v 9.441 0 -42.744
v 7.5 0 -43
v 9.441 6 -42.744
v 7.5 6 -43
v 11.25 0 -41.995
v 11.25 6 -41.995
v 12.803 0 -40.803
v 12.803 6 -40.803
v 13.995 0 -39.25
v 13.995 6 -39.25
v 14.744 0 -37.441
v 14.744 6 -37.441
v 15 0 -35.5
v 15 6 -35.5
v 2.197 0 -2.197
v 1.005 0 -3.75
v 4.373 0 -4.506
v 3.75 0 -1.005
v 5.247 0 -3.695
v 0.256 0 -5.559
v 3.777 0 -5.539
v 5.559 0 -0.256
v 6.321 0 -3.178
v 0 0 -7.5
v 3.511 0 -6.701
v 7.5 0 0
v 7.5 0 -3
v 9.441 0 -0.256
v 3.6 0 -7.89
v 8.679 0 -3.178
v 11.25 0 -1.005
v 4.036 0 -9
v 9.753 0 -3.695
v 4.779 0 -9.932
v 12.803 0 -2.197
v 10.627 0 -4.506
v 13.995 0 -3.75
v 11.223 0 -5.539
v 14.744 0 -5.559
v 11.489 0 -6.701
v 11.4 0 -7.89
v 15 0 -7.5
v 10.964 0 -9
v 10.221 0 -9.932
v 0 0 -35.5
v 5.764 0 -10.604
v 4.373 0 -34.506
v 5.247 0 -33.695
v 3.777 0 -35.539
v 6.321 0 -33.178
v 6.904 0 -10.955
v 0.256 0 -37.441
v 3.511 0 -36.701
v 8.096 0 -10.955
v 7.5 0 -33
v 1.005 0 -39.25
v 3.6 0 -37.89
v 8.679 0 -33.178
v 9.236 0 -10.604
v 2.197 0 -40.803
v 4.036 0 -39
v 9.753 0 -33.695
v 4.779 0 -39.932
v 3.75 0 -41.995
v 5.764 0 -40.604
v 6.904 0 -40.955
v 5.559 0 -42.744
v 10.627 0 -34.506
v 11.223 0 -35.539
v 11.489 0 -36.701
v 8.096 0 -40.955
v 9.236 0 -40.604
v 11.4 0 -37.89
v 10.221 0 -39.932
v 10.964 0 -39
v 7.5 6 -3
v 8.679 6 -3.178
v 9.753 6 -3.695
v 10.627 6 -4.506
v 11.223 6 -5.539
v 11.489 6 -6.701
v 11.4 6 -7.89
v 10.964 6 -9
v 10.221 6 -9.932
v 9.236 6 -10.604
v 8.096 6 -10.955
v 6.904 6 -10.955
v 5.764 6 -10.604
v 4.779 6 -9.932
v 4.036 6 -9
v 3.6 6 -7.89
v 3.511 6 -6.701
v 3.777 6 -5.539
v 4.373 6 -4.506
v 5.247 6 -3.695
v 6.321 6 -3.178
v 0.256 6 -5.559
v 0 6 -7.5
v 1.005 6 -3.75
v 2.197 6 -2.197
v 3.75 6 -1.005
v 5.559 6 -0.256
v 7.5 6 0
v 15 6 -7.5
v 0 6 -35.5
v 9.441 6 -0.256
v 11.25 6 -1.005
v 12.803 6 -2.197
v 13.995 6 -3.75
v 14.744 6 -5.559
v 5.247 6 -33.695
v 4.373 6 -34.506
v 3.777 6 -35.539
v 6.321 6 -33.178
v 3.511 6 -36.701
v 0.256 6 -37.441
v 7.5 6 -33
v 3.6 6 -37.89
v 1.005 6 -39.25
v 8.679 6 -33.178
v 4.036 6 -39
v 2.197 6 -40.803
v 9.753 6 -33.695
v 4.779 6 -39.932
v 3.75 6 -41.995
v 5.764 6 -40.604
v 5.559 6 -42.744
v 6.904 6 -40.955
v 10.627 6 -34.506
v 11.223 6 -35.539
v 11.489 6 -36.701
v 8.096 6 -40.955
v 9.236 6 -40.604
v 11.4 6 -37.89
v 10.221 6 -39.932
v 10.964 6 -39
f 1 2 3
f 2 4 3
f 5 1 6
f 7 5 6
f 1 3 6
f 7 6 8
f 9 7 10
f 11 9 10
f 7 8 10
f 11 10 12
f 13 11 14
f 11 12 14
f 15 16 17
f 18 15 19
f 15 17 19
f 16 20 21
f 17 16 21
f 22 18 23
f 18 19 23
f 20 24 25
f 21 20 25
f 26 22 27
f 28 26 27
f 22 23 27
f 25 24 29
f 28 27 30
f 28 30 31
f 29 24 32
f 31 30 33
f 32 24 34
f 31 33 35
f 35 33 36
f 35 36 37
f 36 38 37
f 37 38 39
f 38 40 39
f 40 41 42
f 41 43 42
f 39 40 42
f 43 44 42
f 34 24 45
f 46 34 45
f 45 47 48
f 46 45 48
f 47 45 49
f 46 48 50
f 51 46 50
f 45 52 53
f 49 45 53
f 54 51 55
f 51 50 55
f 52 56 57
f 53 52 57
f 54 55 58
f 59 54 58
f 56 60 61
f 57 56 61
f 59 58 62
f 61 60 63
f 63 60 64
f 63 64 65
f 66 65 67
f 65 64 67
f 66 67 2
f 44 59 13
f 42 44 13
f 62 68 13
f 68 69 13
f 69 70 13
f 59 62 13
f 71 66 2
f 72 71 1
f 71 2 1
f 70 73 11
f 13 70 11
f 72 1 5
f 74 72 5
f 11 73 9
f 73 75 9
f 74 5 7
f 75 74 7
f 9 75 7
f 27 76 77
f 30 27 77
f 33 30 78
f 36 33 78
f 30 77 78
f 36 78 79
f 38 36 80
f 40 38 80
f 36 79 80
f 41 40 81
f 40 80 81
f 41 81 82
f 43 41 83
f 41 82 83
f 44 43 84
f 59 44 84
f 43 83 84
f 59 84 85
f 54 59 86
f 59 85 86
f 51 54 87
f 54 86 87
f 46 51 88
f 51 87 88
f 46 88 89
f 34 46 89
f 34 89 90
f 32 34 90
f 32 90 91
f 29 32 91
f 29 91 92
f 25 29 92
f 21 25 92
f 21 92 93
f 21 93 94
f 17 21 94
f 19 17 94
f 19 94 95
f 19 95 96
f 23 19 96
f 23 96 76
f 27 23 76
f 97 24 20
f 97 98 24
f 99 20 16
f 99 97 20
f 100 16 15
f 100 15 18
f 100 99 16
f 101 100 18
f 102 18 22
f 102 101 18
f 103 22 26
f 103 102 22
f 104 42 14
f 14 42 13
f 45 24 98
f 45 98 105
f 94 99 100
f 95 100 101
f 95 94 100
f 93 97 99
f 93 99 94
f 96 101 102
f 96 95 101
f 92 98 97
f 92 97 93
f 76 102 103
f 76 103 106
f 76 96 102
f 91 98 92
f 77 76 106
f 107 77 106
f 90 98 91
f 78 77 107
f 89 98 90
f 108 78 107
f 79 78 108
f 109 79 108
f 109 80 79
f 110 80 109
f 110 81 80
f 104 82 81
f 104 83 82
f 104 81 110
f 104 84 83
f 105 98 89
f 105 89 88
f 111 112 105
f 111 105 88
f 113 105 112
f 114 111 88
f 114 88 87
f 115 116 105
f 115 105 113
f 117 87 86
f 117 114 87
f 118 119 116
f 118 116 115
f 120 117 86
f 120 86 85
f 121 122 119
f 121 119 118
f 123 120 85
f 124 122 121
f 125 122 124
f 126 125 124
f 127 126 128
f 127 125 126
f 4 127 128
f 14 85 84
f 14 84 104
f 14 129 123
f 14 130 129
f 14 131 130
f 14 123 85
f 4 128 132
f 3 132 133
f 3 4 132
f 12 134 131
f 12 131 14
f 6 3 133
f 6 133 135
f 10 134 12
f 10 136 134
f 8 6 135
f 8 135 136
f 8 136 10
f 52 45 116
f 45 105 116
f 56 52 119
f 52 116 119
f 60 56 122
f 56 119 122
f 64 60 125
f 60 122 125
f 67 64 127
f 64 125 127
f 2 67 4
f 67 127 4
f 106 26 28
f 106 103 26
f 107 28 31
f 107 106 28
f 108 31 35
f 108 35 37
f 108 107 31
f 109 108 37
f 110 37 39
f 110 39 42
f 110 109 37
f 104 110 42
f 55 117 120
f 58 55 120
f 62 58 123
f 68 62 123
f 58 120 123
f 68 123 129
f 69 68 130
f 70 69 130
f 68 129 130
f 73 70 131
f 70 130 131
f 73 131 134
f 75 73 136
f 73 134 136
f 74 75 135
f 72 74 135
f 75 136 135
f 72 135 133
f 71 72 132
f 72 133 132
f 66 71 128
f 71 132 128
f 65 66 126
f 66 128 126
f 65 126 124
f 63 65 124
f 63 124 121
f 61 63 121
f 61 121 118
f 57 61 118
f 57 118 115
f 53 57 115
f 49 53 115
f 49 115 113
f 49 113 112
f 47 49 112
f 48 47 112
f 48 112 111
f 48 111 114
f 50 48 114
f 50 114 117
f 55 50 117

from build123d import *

# Parameters (mm, degrees)
SKETCH1_W           = 15
SKETCH1_H           = 43
BOSS_EXTRUDE1_DEPTH = 6
SKETCH4_R           = 4
CUT_EXTRUDE2_DEPTH  = 46.934736311
FILLET1_R           = 7.5


with BuildPart() as part:
    # Sketch1 → Boss-Extrude1 (new body)
    with BuildSketch(Plane(origin=(0, 0, 0), x_dir=(1, 0, 0), z_dir=(0, 1, 0))):
        with Locations((7.5, 21.5)):
            Rectangle(SKETCH1_W, SKETCH1_H)
    extrude(amount=BOSS_EXTRUDE1_DEPTH)

    # Sketch4 → Cut-Extrude2 (cut, through all)
    with BuildSketch(Plane(origin=(0, 6, 0), x_dir=(1, 0, 0), z_dir=(0, 1, 0))):
        with Locations(Location((7.5, 37, 0), (0, 0, 270))):
            Circle(SKETCH4_R)
        with Locations(Location((7.5, 7, 0), (0, 0, 270))):
            Circle(SKETCH4_R)
    extrude(amount=-CUT_EXTRUDE2_DEPTH, mode=Mode.SUBTRACT)

    # Fillet1
    fillet1_edges = [part.edges().sort_by_distance(p)[0] for p in [
        (0, 3, 0),
        (15, 3, 0),
        (15, 3, -43),
        (0, 3, -43),
    ]]
    fillet(fillet1_edges, radius=FILLET1_R - 0.0001)  # a hair under: the kernel refuses the full size


solid = part.part
